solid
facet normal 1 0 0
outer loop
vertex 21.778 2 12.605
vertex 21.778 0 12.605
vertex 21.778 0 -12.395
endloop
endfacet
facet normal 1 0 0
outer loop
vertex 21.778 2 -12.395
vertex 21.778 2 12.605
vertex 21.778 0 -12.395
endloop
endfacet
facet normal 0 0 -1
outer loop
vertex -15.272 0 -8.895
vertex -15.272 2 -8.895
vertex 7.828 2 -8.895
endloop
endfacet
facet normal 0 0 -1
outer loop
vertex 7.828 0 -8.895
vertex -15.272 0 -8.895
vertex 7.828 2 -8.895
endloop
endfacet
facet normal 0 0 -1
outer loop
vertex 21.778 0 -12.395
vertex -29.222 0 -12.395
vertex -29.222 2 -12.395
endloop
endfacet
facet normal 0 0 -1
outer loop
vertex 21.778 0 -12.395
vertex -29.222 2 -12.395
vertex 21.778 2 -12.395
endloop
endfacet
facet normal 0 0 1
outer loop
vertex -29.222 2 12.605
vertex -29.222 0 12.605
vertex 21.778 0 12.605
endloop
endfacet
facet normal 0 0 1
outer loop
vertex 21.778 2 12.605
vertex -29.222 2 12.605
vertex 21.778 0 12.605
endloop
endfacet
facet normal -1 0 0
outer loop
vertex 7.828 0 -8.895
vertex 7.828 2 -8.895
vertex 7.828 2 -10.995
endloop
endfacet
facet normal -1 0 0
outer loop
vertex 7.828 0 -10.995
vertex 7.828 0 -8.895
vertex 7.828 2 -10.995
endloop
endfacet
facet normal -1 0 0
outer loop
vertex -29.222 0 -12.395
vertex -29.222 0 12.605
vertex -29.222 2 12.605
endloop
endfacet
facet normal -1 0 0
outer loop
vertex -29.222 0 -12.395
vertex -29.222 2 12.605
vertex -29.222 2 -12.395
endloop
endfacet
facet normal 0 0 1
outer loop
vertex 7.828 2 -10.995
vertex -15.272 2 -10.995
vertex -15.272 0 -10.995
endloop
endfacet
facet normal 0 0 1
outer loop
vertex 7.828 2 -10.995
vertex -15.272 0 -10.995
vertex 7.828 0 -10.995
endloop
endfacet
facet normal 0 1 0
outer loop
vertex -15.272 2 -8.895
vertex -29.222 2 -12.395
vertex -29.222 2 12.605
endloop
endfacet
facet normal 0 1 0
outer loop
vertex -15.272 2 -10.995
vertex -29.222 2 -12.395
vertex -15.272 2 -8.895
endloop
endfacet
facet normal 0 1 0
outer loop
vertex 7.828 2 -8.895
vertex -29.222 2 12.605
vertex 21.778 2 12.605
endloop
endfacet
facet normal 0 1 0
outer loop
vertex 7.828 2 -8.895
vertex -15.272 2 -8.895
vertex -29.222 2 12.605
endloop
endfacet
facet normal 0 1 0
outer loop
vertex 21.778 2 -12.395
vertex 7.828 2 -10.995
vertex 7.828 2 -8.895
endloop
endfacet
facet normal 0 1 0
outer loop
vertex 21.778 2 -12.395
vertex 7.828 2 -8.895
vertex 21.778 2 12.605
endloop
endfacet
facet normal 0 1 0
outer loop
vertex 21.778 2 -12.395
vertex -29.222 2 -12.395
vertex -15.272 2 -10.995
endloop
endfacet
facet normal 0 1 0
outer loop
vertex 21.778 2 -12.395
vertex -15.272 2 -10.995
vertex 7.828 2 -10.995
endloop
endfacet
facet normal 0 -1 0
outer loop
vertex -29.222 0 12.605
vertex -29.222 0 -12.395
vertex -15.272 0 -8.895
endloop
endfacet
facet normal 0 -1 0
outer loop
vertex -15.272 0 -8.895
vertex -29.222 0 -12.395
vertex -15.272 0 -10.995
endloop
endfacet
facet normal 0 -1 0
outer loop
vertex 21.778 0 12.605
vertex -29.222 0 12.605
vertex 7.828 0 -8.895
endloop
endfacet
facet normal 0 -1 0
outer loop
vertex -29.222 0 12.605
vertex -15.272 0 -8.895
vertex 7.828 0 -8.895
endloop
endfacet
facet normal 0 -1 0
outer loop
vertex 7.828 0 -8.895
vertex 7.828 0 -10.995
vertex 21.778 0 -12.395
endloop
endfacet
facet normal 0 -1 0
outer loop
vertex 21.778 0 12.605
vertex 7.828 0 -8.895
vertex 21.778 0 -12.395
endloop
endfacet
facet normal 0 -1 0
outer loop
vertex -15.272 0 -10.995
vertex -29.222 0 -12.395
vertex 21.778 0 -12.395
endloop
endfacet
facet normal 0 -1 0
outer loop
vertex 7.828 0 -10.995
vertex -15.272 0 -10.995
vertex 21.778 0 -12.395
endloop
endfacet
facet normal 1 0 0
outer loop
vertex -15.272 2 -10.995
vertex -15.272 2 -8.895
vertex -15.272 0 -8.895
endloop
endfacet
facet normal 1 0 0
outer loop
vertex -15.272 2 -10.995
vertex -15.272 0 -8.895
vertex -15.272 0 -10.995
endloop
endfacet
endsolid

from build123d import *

# Parameters (mm, degrees)
SKETCH1_W               = 51
SKETCH1_H               = 25
BOSS_EXTRUDE1_DEPTH     = 2
CUT_EXTRUDE1_DEPTH      = 32.886989955
CUT_EXTRUDE1_DEPTH_BACK = 32.886989955
SKETCH3_W               = 13.1
SKETCH3_H               = 2.1
SKETCH4_W               = 23.1
SKETCH4_H               = 2.1
CUT_EXTRUDE2_DEPTH      = 10


with BuildPart() as part:
    # Sketch1 → Boss-Extrude1 (new body)
    with BuildSketch(Plane(origin=(0, 0, 0), x_dir=(1, 0, 0), z_dir=(0, 1, 0))):
        with Locations((-3.721556886, -0.104790419)):
            Rectangle(SKETCH1_W, SKETCH1_H)
    extrude(amount=BOSS_EXTRUDE1_DEPTH)

    # Sketch3 → Cut-Extrude1 (cut, two sides: drawn at the far end of the back side and taken through both)
    with BuildSketch(Plane(origin=(0, 2, 0), x_dir=(1, 0, 0), z_dir=(0, 1, 0)).offset(-CUT_EXTRUDE1_DEPTH_BACK)):
        with Locations((-3.721556886, 9.945209581)):
            Rectangle(SKETCH3_W, SKETCH3_H)
    extrude(amount=CUT_EXTRUDE1_DEPTH + CUT_EXTRUDE1_DEPTH_BACK, mode=Mode.SUBTRACT)

    # Sketch4 → Cut-Extrude2 (cut)
    with BuildSketch(Plane(origin=(0, 2, 0), x_dir=(1, 0, 0), z_dir=(0, 1, 0))):
        with Locations((-3.721556886, 9.945209581)):
            Rectangle(SKETCH4_W, SKETCH4_H)
    extrude(amount=-CUT_EXTRUDE2_DEPTH, mode=Mode.SUBTRACT)


solid = part.part
